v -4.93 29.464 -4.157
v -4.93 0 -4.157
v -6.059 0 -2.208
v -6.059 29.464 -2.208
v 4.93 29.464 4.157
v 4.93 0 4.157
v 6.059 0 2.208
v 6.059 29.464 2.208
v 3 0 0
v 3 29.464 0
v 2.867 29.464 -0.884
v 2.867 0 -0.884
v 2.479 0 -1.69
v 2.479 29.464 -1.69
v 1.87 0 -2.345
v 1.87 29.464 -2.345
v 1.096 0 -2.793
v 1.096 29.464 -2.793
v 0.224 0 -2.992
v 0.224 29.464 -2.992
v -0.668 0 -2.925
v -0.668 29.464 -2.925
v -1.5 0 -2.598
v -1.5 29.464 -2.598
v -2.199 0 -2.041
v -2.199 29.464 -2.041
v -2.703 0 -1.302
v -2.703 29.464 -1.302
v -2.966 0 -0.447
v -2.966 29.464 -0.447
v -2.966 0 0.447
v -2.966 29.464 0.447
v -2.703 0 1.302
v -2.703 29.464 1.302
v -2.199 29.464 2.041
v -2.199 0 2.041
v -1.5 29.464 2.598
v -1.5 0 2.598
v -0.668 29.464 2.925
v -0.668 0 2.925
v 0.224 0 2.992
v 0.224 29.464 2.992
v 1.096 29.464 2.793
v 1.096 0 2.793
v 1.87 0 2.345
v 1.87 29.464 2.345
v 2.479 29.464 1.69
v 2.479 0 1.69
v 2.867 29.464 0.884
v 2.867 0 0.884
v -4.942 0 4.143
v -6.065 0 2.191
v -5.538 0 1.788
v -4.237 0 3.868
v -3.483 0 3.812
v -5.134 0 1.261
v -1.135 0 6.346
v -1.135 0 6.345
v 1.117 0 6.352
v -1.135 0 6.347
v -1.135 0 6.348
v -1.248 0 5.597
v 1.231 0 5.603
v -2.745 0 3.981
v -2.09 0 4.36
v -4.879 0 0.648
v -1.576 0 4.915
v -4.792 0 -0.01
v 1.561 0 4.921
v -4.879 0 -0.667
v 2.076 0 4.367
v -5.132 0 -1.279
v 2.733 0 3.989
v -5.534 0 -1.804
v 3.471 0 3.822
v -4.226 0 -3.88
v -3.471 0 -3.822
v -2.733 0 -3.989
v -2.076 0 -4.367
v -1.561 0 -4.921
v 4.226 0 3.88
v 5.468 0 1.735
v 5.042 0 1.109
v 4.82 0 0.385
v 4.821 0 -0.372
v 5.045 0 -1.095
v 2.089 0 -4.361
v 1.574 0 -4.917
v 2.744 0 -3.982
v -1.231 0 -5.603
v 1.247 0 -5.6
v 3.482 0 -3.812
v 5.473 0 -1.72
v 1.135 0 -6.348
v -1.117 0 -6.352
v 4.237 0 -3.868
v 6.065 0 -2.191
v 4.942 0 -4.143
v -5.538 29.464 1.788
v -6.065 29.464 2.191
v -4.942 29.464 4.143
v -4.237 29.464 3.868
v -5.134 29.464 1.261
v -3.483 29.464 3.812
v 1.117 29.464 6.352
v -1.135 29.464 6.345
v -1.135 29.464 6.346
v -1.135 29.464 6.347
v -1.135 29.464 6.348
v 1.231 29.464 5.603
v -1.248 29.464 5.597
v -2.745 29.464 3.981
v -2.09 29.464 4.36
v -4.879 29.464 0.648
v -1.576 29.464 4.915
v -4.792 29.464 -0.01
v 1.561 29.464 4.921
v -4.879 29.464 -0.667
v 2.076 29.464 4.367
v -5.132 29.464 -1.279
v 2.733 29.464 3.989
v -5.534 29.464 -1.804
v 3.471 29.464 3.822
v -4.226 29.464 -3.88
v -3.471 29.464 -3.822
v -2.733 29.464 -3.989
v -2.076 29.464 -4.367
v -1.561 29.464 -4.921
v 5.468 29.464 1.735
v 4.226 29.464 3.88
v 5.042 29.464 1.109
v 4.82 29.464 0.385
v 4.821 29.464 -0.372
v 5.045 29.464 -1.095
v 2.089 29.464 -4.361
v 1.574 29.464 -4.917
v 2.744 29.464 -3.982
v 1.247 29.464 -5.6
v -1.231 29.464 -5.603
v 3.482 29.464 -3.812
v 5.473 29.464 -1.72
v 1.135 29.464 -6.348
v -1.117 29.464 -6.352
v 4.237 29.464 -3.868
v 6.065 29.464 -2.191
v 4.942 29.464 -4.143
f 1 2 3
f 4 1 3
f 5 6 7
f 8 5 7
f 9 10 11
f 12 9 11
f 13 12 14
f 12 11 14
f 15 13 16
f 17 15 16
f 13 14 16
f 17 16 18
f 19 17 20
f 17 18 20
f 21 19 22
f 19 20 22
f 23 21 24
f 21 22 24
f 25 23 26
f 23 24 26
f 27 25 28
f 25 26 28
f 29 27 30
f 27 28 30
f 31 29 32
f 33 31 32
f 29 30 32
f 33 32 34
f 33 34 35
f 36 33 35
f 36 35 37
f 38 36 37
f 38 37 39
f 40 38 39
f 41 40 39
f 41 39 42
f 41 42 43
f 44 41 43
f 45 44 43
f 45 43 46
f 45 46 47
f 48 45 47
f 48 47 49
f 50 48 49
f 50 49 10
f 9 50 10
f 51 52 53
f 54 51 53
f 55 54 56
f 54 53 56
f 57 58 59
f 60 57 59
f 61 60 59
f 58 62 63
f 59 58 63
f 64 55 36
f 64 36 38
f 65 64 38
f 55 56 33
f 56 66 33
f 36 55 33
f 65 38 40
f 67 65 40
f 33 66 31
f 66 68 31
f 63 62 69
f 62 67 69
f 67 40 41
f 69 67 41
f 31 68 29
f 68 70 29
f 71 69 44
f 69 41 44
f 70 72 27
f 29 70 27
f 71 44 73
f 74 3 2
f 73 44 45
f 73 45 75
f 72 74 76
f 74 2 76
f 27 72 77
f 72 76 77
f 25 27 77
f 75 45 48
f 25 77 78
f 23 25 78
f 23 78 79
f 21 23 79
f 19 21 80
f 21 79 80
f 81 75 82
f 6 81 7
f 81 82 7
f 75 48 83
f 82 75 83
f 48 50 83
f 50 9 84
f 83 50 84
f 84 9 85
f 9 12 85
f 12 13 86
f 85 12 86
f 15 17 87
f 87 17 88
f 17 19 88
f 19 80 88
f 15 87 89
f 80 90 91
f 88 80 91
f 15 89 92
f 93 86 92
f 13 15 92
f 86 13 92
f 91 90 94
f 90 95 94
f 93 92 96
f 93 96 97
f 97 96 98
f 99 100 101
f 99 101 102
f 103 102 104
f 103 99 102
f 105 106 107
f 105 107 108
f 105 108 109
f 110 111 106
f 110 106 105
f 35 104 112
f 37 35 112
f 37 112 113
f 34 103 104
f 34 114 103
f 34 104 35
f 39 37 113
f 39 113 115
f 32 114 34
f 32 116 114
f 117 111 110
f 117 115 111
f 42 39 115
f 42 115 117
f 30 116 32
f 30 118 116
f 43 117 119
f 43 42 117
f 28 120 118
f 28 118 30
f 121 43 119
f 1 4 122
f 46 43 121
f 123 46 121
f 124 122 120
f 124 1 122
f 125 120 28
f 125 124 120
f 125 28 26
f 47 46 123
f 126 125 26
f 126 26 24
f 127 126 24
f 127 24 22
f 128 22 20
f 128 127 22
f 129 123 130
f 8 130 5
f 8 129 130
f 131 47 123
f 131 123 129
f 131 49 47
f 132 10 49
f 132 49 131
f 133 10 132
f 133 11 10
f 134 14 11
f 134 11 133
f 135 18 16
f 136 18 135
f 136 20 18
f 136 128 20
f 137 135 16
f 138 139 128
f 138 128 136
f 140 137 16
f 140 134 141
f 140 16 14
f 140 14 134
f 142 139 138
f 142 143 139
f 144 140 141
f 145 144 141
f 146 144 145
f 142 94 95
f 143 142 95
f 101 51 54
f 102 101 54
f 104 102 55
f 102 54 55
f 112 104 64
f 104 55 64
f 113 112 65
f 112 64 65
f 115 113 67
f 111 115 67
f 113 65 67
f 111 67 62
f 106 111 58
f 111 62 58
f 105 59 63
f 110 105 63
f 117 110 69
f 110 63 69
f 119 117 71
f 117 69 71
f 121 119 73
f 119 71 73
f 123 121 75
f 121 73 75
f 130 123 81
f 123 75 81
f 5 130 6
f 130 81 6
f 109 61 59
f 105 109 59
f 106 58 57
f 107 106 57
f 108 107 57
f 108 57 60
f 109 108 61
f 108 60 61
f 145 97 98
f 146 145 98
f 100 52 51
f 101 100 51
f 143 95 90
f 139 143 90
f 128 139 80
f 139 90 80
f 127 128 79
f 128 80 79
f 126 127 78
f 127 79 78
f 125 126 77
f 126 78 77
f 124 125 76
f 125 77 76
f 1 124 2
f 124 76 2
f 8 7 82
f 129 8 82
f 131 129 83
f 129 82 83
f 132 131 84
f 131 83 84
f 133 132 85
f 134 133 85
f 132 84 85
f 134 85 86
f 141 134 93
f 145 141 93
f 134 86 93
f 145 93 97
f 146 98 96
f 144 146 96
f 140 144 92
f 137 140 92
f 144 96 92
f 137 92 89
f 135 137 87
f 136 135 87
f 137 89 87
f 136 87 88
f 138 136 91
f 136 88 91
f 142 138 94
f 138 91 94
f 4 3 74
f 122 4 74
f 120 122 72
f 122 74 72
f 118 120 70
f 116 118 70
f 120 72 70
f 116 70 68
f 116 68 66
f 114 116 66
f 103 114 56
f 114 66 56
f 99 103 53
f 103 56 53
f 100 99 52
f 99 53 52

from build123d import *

# Parameters (mm, degrees)
BOSS_EXTRUDE1_DEPTH = 29.464
SKETCH2_R           = 3
CUT_EXTRUDE1_DEPTH  = 254


with BuildPart() as part:
    # Sketch1 → Boss-Extrude1 (new body)
    with BuildSketch(Plane(origin=(0, 0, 0), x_dir=(1, 0, 0), z_dir=(0, 1, 0))):
        with BuildLine():
            ThreePointArc((1.117349967, -6.351558659), (2.390405172, -4.153620888), (4.93040272, -4.15715015))
            Line((4.93040272, -4.15715015), (6.059286136, -2.208125873))
            ThreePointArc((6.059286136, -2.208125873), (4.792343793, -0.00665884), (6.065398997, 2.191278931))
            Line((6.065398997, 2.191278931), (4.941936169, 4.143432786))
            ThreePointArc((4.941936169, 4.143432786), (2.401938621, 4.146962048), (1.134996277, 6.348429081))
            Line((1.134996277, 6.348429081), (-1.117349967, 6.351558659))
            ThreePointArc((-1.117349967, 6.351558659), (-2.390405172, 4.153620888), (-4.93040272, 4.15715015))
            Line((-4.93040272, 4.15715015), (-6.059286136, 2.208125873))
            ThreePointArc((-6.059286136, 2.208125873), (-5.13175503, 1.27865958), (-4.792341341, 0.010188102))
            ThreePointArc((-4.792341341, 0.010188102), (-5.133519662, -1.261339807), (-6.065398997, -2.191278931))
            Line((-6.065398997, -2.191278931), (-4.941936169, -4.143432786))
            ThreePointArc((-4.941936169, -4.143432786), (-2.403465916, -4.14607814), (-1.134993825, -6.344899819))
            ThreePointArc((-1.134993825, -6.344899819), (-1.134994438, -6.346664451), (-1.134996277, -6.348429081))
            Line((-1.134996277, -6.348429081), (1.117349967, -6.351558659))
        make_face()
    extrude(amount=BOSS_EXTRUDE1_DEPTH)

    # Sketch2 → Cut-Extrude1 (cut)
    with BuildSketch(Plane(origin=(0, 29.464, 0), x_dir=(1, 0, 0), z_dir=(0, 1, 0))):
        Circle(SKETCH2_R)
    extrude(amount=-CUT_EXTRUDE1_DEPTH, mode=Mode.SUBTRACT)


solid = part.part
